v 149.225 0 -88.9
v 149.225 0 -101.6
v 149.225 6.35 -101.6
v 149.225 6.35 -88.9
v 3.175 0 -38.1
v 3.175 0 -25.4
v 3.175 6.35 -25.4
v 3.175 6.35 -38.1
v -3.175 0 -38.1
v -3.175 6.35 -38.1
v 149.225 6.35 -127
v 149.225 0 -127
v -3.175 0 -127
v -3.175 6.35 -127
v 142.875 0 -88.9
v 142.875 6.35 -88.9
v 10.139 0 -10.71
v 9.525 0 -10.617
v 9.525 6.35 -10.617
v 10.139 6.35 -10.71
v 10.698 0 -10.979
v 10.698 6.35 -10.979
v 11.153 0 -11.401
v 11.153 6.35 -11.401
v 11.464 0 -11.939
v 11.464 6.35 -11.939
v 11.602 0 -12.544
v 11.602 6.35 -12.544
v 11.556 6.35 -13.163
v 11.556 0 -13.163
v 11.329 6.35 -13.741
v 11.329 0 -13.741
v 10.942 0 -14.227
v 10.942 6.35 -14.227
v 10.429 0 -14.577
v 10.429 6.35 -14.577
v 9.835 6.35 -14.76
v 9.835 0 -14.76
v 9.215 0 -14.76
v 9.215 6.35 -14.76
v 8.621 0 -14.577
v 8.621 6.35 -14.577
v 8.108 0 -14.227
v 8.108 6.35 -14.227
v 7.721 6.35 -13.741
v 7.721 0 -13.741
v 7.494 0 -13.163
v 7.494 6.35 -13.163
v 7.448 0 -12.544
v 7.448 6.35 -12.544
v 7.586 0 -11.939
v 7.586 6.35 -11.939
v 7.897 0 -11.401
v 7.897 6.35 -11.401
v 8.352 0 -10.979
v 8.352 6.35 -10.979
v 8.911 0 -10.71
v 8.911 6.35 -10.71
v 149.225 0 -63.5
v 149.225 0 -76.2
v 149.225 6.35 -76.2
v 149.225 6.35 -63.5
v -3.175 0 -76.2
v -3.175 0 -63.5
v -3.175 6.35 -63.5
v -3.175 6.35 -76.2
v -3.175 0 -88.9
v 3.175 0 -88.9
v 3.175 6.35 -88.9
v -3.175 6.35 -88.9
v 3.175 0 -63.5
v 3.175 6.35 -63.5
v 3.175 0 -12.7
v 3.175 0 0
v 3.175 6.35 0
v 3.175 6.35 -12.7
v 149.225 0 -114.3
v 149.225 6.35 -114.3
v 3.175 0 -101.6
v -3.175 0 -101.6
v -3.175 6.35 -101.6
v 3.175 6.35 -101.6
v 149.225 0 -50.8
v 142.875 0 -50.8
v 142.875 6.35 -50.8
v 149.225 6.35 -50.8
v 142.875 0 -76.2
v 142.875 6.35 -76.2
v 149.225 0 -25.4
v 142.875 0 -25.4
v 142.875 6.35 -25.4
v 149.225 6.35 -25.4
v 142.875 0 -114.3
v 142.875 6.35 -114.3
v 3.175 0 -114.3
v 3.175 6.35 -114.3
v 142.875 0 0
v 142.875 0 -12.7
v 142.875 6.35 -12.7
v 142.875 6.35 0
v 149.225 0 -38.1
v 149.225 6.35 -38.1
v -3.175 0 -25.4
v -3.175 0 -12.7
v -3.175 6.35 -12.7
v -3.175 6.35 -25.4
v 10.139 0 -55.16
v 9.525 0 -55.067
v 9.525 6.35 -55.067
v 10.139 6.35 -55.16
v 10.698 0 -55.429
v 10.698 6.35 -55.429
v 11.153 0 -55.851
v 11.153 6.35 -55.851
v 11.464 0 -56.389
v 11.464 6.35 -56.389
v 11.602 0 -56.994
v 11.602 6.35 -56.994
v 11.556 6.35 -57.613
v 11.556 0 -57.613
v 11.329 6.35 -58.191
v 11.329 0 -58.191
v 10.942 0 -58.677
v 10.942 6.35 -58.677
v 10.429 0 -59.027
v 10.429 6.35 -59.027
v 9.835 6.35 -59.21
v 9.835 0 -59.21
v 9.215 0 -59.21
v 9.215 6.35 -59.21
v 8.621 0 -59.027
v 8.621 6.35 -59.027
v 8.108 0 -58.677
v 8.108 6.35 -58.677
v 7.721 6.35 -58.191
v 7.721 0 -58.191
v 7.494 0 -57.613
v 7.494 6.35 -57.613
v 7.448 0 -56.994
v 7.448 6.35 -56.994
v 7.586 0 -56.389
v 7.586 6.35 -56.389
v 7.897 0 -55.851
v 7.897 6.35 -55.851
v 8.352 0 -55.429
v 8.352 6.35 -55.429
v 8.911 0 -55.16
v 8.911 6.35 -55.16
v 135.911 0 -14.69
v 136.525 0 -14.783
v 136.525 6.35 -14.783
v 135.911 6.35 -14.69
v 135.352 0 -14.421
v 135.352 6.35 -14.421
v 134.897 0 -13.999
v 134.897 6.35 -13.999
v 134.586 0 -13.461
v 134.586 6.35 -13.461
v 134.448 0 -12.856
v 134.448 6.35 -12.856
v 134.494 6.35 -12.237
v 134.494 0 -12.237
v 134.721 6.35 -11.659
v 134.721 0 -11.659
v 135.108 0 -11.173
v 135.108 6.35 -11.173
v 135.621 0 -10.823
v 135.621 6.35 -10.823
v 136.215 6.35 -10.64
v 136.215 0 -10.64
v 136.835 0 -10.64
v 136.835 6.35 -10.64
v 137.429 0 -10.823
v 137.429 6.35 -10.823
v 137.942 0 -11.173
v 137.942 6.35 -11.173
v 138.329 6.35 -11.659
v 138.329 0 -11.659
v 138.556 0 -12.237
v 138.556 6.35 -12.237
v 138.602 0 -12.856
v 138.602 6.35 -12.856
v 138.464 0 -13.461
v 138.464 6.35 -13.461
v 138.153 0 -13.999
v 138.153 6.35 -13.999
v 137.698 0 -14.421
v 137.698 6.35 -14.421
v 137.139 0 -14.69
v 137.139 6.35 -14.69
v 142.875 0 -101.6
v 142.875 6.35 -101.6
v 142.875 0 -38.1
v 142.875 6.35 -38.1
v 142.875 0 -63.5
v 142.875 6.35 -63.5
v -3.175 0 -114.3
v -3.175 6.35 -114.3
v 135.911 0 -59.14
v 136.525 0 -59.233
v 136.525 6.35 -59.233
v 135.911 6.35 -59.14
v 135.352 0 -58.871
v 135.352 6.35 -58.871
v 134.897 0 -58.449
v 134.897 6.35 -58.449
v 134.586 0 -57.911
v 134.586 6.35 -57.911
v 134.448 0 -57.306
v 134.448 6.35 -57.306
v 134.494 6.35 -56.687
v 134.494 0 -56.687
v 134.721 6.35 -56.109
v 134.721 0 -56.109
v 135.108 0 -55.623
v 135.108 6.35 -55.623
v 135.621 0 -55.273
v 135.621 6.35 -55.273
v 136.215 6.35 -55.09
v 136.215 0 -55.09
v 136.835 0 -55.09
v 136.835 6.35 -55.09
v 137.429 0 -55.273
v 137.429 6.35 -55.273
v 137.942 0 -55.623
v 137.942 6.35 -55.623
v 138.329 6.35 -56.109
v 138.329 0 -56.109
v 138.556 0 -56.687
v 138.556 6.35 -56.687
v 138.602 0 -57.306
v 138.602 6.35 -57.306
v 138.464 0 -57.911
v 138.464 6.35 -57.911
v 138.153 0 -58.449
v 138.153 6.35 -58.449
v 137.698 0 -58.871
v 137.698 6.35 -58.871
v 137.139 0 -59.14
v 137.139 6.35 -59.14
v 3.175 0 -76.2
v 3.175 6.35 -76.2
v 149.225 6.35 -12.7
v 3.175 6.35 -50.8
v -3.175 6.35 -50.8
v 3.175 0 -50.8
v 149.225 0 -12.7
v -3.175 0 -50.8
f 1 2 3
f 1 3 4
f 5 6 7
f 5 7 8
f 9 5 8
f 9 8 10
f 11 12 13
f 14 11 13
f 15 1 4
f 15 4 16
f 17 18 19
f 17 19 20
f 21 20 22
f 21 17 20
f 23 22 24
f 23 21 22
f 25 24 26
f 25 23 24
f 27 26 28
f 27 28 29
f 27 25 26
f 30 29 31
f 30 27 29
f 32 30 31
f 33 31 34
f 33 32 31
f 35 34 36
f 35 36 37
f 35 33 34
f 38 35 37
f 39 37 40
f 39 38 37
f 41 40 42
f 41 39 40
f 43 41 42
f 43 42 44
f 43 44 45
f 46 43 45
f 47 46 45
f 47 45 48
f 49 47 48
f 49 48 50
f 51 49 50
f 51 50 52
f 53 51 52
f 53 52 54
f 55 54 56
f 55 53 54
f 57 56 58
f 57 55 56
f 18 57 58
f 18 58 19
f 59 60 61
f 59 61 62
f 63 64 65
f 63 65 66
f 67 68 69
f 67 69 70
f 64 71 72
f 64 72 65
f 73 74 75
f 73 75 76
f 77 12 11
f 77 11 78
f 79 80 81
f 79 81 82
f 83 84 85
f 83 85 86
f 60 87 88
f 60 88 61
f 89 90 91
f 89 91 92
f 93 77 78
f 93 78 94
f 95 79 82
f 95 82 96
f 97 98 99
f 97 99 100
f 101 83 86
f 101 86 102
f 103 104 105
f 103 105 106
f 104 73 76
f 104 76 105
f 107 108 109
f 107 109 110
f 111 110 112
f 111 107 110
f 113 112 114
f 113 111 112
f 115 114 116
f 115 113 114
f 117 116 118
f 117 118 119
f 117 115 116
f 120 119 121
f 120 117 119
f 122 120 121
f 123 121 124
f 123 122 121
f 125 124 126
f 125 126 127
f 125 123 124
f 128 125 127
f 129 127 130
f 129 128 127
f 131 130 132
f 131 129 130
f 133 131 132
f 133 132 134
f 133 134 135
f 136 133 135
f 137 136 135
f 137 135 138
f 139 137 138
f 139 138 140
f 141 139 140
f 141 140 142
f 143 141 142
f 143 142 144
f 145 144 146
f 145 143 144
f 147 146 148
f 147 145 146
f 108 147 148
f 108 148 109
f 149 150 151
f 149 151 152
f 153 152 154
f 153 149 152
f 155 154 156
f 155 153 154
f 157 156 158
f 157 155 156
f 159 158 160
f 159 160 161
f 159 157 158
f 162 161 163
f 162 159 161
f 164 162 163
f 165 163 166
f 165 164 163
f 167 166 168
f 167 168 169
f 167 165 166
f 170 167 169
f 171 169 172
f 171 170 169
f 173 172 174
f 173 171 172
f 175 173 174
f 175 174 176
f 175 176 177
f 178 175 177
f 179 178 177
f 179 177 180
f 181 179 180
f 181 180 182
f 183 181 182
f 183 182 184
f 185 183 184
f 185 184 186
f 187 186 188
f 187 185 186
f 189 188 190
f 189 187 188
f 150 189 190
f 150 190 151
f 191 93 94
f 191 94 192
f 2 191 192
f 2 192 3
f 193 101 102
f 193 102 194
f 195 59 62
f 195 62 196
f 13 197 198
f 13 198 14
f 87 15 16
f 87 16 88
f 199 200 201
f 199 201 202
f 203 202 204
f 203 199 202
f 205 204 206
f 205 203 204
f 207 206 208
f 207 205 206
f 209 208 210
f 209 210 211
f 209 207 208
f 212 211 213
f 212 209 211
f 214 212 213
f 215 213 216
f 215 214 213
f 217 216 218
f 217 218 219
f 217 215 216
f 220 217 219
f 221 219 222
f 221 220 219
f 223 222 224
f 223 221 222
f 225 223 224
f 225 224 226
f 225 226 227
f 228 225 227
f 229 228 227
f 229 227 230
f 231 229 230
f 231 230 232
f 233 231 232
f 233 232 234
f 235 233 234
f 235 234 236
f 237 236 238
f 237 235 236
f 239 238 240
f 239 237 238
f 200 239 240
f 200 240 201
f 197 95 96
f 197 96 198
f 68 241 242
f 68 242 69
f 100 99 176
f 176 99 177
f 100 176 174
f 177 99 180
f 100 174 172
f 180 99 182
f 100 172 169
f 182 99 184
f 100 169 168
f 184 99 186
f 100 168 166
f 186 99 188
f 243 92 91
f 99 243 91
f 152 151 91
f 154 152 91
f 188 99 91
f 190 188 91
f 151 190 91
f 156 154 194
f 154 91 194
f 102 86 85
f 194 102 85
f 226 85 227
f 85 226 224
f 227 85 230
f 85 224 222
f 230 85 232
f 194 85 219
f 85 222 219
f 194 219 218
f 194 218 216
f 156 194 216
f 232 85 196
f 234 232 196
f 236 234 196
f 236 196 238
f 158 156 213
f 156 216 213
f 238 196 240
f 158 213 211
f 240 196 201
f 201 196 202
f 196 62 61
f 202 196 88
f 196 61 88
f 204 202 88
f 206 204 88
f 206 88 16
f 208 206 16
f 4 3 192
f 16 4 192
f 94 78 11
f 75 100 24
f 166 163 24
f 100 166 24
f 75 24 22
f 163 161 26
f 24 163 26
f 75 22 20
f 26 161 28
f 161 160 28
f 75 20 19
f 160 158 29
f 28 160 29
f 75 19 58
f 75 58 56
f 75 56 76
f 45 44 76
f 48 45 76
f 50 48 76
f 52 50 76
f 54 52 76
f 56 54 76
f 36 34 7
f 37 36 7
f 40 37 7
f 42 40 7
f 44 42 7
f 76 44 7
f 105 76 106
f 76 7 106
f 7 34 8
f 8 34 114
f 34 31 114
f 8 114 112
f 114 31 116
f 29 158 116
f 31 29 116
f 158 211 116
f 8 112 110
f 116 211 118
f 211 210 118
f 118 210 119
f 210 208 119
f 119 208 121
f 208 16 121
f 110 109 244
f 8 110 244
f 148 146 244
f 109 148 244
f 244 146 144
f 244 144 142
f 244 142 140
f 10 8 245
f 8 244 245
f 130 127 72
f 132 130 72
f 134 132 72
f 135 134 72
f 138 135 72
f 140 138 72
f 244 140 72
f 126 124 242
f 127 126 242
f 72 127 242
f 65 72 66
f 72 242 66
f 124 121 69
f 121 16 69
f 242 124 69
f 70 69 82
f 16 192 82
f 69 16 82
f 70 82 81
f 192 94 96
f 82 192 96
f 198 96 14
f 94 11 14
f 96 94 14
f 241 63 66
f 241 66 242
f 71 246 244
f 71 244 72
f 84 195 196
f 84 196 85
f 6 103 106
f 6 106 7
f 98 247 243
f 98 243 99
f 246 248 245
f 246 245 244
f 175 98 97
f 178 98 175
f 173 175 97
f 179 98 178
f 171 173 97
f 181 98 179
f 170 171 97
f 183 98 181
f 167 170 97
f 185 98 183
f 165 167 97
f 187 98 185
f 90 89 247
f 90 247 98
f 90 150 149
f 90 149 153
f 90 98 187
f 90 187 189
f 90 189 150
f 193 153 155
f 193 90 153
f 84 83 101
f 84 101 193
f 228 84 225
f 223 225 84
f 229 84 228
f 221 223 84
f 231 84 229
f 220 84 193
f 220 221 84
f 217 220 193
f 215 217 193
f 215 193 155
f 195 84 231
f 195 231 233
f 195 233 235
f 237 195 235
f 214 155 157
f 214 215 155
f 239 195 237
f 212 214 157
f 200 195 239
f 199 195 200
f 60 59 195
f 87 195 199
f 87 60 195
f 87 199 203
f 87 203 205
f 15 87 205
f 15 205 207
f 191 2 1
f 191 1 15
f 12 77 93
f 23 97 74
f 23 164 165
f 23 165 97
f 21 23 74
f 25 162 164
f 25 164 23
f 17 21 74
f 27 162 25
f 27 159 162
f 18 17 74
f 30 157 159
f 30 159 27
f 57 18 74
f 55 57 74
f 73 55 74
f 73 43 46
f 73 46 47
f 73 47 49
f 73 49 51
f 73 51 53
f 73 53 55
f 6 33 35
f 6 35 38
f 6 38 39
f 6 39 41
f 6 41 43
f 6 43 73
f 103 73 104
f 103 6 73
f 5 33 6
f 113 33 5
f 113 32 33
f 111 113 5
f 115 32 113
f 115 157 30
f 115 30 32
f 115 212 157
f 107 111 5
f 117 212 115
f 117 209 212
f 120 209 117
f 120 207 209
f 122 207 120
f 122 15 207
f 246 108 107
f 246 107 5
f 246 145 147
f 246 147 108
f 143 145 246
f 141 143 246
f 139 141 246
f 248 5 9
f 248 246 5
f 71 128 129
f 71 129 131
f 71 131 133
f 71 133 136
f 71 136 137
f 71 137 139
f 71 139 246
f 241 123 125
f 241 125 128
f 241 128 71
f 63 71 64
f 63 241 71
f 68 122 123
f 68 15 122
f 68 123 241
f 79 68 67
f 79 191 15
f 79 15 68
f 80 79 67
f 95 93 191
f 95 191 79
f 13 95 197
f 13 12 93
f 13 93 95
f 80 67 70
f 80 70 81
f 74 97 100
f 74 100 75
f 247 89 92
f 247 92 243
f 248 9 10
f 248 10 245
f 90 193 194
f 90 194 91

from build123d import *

# Parameters (mm, degrees)
SKETCH2_R           = 2.0828
BOSS_EXTRUDE1_DEPTH = 6.35


with BuildPart() as part:
    # Sketch2 → Boss-Extrude1 (new body)
    with BuildSketch(Plane(origin=(0, 0, 0), x_dir=(1, 0, 0), z_dir=(0, 1, 0))):
        Polygon((3.175, 0), (3.175, 12.7), (-3.175, 12.7), (-3.175, 25.4), (3.175, 25.4), (3.175, 38.1), (-3.175, 38.1), (-3.175, 50.8), (3.175, 50.8), (3.175, 63.5), (-3.175, 63.5), (-3.175, 76.2), (3.175, 76.2), (3.175, 88.9), (-3.175, 88.9), (-3.175, 101.6), (3.175, 101.6), (3.175, 114.3), (-3.175, 114.3), (-3.175, 127), (3.175, 127), (142.875, 127), (149.225, 127), (149.225, 114.3), (142.875, 114.3), (142.875, 101.6), (149.225, 101.6), (149.225, 88.9), (142.875, 88.9), (142.875, 76.2), (149.225, 76.2), (149.225, 63.5), (142.875, 63.5), (142.875, 50.8), (149.225, 50.8), (149.225, 38.1), (142.875, 38.1), (142.875, 25.4), (149.225, 25.4), (149.225, 12.7), (142.875, 12.7), (142.875, 0), align=None)
        with Locations(Location((136.525, 57.15, 0), (0, 0, 90))):
            Circle(SKETCH2_R, mode=Mode.SUBTRACT)
        with Locations(Location((9.525, 12.7, 0), (0, 0, 270))):
            Circle(SKETCH2_R, mode=Mode.SUBTRACT)
        with Locations(Location((9.525, 57.15, 0), (0, 0, 270))):
            Circle(SKETCH2_R, mode=Mode.SUBTRACT)
        with Locations(Location((136.525, 12.7, 0), (0, 0, 90))):
            Circle(SKETCH2_R, mode=Mode.SUBTRACT)
    extrude(amount=BOSS_EXTRUDE1_DEPTH)


solid = part.part
